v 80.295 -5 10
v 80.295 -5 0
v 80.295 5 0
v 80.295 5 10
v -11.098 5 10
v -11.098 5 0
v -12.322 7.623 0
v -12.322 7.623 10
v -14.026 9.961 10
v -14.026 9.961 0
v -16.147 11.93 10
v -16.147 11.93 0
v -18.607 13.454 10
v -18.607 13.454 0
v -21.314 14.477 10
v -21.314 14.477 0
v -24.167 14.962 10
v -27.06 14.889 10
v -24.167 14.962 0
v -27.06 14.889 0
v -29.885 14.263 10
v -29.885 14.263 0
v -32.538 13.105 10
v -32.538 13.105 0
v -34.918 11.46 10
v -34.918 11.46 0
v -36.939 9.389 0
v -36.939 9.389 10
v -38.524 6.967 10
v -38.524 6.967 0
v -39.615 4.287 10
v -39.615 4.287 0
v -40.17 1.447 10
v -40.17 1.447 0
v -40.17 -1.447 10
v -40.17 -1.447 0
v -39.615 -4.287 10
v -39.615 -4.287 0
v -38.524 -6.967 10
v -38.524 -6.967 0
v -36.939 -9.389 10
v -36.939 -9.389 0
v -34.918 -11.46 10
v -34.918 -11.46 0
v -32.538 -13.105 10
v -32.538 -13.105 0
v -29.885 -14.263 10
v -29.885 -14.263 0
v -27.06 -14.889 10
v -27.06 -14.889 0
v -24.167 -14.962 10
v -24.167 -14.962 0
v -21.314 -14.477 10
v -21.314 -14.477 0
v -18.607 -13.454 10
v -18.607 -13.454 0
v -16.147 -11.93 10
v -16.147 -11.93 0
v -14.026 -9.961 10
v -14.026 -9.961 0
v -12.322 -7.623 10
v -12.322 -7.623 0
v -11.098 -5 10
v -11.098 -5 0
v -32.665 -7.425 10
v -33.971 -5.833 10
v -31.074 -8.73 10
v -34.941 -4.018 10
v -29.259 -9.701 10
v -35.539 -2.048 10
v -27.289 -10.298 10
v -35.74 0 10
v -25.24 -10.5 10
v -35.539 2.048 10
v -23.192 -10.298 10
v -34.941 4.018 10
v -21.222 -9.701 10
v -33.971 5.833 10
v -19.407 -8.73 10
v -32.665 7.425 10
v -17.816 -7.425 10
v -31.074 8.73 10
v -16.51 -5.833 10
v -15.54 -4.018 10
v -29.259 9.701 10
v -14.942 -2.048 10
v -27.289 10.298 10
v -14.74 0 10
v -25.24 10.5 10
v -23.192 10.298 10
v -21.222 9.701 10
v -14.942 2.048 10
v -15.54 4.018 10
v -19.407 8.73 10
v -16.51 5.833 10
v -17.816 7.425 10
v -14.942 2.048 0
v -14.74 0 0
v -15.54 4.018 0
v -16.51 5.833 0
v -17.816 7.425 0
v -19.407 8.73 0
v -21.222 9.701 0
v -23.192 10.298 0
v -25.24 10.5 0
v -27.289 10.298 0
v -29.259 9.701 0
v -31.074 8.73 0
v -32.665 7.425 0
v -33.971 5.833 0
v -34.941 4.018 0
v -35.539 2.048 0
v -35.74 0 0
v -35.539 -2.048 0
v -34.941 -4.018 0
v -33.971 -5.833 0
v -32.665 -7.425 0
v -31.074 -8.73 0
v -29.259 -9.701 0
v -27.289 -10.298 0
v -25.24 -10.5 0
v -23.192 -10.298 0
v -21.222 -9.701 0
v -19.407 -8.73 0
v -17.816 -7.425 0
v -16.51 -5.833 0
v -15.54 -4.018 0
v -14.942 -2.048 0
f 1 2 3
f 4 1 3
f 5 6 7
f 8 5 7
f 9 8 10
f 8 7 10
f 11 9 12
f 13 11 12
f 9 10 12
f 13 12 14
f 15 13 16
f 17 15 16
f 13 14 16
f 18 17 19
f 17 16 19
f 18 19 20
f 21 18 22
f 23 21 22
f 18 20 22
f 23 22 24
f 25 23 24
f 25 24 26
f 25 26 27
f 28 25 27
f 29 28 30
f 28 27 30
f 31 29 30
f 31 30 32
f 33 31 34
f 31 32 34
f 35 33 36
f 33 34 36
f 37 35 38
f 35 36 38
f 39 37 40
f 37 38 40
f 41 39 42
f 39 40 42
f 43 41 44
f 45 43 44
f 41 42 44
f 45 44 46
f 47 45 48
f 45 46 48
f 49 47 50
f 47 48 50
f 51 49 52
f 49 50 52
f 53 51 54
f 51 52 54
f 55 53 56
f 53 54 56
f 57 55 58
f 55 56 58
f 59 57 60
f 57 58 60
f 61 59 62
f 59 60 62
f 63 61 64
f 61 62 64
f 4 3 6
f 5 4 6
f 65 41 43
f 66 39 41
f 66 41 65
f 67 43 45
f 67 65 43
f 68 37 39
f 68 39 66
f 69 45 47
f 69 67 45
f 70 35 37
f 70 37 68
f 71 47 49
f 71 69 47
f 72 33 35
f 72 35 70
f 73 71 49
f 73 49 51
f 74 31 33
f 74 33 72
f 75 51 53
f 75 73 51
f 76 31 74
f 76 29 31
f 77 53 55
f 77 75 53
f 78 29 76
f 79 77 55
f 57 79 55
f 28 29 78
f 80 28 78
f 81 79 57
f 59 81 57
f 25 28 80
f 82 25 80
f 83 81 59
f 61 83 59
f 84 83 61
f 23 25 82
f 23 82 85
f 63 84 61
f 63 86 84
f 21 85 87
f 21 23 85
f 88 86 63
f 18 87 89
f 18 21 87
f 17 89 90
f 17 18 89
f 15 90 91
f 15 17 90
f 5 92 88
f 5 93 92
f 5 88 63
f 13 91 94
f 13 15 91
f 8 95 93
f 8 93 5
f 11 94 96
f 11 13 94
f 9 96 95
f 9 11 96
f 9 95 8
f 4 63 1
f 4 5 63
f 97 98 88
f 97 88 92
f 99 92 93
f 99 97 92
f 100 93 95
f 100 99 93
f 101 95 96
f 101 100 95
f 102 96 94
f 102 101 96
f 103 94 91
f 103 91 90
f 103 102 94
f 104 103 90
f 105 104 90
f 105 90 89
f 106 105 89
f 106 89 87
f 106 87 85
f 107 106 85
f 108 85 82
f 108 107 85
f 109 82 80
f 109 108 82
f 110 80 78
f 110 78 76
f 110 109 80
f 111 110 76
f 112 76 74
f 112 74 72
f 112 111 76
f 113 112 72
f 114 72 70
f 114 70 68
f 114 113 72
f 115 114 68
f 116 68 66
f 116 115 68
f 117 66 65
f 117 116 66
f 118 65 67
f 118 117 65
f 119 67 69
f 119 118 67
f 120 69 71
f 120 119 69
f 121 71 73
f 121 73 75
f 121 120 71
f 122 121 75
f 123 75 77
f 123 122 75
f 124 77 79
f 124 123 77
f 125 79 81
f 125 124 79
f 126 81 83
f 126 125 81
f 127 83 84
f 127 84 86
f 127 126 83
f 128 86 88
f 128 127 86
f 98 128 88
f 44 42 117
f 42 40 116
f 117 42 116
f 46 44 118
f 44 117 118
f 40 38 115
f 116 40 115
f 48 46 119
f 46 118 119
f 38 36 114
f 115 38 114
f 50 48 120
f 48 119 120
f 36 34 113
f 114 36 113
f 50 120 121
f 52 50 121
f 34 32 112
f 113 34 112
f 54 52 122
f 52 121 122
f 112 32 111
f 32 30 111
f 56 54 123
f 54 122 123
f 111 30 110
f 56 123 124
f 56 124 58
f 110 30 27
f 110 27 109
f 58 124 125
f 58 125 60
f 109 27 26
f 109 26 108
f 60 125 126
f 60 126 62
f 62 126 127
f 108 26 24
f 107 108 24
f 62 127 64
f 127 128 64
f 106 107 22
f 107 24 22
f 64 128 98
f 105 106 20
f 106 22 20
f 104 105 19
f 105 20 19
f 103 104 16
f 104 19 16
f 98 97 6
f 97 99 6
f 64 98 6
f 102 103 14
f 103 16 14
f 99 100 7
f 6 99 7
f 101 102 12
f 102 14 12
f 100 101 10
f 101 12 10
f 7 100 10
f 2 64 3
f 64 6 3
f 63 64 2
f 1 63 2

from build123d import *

# Parameters (mm, degrees)
IZIM1_R                     = 10.5
Y_KSEKLIK_EKSTR_ZYON1_DEPTH = 10


with BuildPart() as part:
    # Çizim1 → Yükseklik-Ekstrüzyon1 (new body)
    with BuildSketch(Plane.XY):
        with BuildLine():
            Line((80.295084686, 5), (-11.098302389, 5))
            ThreePointArc((-11.098302389, 5), (-40.240438013, 0), (-11.098302389, -5))
            Line((-11.098302389, -5), (80.295084686, -5))
            Line((80.295084686, -5), (80.295084686, 5))
        make_face()
        with Locations((-25.240438013, 0)):
            Circle(IZIM1_R, mode=Mode.SUBTRACT)
    extrude(amount=Y_KSEKLIK_EKSTR_ZYON1_DEPTH)


solid = part.part
